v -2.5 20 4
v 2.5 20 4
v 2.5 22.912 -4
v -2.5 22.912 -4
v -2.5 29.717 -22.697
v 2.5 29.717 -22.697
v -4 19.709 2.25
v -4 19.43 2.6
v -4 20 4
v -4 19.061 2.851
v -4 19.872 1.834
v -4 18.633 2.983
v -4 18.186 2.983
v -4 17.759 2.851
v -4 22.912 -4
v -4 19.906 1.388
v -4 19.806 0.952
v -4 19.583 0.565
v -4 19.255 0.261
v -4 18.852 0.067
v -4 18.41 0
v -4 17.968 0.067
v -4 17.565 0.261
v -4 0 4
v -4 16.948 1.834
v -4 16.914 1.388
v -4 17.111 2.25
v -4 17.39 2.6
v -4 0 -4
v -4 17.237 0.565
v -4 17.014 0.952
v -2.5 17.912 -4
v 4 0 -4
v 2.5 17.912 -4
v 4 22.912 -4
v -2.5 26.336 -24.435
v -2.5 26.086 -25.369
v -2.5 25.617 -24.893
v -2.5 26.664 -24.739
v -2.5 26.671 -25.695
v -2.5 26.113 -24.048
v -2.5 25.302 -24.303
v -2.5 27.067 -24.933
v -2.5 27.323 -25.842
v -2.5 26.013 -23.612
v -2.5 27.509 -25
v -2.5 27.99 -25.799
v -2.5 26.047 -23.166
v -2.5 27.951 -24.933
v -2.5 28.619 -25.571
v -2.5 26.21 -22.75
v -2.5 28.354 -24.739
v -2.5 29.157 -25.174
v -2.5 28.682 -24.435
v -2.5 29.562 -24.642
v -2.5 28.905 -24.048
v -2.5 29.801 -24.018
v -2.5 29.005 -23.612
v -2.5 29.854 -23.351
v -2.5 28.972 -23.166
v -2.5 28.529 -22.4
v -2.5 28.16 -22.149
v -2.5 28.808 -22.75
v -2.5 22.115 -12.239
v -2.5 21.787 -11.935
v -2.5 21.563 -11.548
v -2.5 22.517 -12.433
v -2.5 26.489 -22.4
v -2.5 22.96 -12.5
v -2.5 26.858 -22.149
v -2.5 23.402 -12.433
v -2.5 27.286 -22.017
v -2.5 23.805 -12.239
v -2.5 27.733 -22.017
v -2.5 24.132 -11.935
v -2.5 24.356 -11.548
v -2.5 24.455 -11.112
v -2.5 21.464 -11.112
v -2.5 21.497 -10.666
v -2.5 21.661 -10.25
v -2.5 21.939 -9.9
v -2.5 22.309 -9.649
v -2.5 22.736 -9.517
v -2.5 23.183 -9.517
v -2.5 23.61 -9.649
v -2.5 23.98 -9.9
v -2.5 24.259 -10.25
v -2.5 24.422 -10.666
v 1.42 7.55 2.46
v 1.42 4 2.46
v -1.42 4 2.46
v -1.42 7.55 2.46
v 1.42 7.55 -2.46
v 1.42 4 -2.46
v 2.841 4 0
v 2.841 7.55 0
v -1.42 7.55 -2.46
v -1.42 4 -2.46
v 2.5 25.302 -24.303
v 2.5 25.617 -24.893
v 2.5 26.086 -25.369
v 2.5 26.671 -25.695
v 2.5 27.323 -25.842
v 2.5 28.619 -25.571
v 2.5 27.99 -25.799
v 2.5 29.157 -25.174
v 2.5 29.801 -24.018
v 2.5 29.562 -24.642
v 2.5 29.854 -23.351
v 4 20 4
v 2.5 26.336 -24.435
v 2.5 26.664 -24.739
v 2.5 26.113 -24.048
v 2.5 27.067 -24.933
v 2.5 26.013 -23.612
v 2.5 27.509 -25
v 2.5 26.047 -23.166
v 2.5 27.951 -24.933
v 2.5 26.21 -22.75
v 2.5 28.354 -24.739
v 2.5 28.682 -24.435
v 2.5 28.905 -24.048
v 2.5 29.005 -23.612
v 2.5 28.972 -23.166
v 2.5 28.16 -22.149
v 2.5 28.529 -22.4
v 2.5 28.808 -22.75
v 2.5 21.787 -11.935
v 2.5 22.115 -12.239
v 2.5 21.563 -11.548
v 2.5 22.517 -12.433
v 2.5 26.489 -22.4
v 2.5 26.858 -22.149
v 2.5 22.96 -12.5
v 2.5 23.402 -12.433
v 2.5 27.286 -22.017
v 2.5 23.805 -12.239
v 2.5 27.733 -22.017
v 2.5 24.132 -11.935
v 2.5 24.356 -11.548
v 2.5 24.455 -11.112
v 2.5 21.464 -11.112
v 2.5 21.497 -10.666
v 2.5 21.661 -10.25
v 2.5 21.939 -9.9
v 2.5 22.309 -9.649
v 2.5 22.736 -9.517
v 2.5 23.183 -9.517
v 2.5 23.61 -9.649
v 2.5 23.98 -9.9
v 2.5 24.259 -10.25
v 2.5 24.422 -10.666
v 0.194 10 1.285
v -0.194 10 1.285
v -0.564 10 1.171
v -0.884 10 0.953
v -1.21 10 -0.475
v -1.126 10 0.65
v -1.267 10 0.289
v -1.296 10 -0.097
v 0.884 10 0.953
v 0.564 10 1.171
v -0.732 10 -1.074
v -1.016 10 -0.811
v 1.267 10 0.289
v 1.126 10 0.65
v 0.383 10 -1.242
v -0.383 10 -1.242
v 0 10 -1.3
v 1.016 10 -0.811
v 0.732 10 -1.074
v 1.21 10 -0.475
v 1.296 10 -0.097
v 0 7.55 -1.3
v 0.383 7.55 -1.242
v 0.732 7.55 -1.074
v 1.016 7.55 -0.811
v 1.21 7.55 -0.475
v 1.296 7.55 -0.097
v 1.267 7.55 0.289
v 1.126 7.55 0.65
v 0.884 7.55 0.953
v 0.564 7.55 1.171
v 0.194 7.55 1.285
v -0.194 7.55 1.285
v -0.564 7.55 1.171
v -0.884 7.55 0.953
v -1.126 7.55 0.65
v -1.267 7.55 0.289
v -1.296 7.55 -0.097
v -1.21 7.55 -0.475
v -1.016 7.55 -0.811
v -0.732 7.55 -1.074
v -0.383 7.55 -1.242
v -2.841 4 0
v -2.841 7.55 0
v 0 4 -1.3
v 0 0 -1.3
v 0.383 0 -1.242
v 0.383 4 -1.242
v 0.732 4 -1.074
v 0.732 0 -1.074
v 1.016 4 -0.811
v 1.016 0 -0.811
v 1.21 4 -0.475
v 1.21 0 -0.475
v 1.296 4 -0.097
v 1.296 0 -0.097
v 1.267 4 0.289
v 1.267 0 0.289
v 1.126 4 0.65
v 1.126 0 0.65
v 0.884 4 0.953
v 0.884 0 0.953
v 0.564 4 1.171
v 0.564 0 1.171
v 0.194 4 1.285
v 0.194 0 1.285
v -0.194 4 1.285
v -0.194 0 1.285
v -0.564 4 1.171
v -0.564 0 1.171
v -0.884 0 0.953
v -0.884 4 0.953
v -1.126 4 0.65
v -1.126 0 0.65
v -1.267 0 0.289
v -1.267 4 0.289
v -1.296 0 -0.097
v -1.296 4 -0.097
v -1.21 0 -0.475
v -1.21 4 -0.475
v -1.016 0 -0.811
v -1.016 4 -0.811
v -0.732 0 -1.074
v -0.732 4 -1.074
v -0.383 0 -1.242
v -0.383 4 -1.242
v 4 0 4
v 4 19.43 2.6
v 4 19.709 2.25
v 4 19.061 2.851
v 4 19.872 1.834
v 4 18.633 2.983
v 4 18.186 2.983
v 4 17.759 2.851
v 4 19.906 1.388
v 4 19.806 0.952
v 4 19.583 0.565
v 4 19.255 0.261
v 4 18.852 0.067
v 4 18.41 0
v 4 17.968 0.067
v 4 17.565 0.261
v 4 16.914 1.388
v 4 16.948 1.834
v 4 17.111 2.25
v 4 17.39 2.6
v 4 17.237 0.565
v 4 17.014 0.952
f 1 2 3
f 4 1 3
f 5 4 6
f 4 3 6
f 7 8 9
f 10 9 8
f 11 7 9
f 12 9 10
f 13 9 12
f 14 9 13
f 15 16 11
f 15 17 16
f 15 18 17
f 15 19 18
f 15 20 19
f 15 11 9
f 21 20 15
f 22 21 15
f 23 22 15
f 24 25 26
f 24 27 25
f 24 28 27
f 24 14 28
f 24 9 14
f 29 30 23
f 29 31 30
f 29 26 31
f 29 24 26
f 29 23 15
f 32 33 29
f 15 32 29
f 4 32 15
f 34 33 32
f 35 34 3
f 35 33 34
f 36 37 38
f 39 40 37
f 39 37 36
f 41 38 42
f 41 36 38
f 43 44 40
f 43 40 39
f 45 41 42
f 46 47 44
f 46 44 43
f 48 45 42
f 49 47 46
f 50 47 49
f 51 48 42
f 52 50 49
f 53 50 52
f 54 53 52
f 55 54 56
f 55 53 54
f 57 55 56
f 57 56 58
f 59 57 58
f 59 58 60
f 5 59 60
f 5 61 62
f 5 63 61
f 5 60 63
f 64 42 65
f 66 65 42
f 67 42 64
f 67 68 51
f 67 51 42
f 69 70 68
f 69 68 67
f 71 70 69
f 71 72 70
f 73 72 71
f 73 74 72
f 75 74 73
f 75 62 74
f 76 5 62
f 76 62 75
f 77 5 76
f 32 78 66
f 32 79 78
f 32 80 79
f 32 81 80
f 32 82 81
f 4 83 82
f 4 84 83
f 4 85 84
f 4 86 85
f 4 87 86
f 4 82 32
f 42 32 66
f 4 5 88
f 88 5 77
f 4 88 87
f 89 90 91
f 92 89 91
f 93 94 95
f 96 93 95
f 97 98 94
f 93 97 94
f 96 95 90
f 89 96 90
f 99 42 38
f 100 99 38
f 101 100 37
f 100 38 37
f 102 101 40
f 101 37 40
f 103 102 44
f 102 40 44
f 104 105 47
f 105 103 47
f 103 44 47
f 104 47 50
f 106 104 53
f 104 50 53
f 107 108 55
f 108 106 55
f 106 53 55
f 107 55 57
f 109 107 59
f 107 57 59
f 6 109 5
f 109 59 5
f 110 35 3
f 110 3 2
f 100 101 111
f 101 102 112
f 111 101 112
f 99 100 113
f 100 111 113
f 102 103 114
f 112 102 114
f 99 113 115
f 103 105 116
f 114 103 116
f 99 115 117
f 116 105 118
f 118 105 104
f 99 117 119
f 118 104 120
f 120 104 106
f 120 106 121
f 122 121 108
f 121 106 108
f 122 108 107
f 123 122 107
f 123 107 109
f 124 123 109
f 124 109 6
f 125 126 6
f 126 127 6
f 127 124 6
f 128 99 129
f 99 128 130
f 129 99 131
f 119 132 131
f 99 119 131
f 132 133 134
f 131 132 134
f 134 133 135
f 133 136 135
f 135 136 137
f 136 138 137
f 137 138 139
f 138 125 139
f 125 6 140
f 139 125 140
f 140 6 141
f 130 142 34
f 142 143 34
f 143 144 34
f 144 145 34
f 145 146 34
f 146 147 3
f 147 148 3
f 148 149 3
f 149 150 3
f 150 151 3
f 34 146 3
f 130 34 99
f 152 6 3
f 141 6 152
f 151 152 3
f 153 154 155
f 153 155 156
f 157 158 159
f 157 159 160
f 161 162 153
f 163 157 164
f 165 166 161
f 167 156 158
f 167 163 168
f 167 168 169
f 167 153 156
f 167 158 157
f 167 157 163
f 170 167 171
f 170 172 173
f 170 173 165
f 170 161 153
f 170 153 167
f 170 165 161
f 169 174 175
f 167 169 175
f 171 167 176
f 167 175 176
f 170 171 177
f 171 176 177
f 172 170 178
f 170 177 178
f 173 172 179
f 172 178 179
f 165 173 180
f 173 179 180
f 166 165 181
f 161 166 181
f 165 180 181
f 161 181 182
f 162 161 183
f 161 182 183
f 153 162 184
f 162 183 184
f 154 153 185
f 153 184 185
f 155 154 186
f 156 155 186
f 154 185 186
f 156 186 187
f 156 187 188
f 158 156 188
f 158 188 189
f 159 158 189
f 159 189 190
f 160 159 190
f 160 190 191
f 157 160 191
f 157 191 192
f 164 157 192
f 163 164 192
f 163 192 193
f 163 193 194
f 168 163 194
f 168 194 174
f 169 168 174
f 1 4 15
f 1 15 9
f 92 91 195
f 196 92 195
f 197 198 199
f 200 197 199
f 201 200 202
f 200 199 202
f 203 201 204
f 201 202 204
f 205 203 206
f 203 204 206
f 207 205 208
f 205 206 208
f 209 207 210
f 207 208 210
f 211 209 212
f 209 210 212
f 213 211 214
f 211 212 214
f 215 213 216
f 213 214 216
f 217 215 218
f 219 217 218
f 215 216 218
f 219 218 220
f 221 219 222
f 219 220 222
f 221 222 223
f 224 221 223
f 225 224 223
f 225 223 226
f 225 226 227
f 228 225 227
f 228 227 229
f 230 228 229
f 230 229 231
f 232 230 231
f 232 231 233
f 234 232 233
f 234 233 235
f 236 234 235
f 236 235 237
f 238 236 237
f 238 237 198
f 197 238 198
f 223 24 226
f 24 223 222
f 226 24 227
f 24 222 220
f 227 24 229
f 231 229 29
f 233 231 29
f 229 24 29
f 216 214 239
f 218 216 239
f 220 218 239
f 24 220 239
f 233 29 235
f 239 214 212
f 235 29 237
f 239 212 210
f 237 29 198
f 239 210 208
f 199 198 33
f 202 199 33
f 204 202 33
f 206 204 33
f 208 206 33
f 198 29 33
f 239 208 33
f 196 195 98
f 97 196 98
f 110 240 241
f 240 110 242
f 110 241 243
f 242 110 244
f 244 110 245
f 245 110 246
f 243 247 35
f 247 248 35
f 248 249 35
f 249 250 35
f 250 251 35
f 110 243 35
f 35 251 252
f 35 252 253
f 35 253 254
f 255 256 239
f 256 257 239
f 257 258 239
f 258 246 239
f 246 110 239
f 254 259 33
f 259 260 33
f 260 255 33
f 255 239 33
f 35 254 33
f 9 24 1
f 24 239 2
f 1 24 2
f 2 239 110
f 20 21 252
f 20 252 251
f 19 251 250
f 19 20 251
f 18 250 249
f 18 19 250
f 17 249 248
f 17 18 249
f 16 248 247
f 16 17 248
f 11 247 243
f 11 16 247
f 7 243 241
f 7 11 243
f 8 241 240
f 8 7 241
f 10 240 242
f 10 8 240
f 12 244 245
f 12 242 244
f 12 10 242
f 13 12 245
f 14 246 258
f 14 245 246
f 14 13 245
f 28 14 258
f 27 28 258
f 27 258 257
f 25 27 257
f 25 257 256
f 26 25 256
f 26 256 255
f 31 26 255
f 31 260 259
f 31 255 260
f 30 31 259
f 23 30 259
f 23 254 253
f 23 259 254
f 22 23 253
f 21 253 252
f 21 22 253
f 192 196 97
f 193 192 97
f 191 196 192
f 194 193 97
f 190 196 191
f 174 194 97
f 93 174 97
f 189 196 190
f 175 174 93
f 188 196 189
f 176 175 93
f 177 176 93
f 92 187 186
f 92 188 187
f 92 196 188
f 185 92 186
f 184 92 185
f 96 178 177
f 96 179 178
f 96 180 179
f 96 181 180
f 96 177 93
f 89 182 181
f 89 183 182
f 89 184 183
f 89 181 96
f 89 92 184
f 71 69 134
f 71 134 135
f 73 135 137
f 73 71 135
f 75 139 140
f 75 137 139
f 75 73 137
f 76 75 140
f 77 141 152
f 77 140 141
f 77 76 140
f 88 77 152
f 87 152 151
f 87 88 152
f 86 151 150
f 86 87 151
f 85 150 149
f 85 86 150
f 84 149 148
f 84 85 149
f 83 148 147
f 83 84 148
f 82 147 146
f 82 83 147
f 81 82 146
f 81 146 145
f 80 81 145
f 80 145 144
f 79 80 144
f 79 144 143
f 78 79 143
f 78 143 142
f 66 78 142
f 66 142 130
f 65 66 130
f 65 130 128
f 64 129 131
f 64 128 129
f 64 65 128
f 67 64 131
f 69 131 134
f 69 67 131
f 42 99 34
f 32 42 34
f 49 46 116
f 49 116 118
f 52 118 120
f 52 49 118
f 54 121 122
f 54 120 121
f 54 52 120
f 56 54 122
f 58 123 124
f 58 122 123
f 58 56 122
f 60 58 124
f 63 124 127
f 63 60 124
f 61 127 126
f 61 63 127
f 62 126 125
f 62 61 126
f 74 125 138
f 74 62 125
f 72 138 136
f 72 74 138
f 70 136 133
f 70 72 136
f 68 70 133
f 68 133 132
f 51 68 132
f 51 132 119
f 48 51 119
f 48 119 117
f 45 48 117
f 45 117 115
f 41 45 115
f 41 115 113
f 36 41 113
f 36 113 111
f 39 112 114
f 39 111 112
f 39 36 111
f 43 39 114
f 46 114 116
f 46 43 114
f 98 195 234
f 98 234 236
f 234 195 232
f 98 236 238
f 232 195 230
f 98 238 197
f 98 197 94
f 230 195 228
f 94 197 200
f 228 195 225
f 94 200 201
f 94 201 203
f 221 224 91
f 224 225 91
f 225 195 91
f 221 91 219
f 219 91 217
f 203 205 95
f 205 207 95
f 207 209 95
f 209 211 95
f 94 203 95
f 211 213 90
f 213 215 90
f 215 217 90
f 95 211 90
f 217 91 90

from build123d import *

# Parameters (mm, degrees)
SKETCH_1_W               = 8
SKETCH_1_H               = 8
EXTRUDE_1_DEPTH          = 20
EXTRUDE_2_DEPTH          = 2.5
CUT_EXTRUDE_1_DEPTH      = 41.91749234
CUT_EXTRUDE_1_DEPTH_BACK = 41.91749234
SKETCH_4_R               = 1.5
CUT_EXTRUDE_2_DEPTH      = 41.91749234
SKETCH_9_R               = 1.3
CUT_EXTRUDE_3_DEPTH      = 10
EXTRUDE_3_DEPTH          = 8
CUT_EXTRUDE_START        = -4
CUT_EXTRUDE_4_DEPTH      = 3.55


with BuildPart() as part:
    # 草图1 → 凸台-拉伸1 (new body)
    with BuildSketch(Plane(origin=(0, 0, 0), x_dir=(1, 0, 0), z_dir=(0, 1, 0))):
        Rectangle(SKETCH_1_W, SKETCH_1_H)
    extrude(amount=EXTRUDE_1_DEPTH)

    # 草图2 → 凸台-拉伸2 (add, symmetric)
    with BuildSketch(Plane(origin=(0, 0, 0), x_dir=(0, 0, -1), z_dir=(1, 0, 0))):
        Polygon((-4, 20), (26, 30.919107028), (26, 25.919107028), (-4, 15), align=None)
    extrude(amount=EXTRUDE_2_DEPTH, both=True)

    # 草图4 → 切除-拉伸1 (cut, two sides: drawn at the far end of the back side and taken through both)
    with BuildSketch(Plane(origin=(2.5, 0, 0), x_dir=(0, 0, -1), z_dir=(1, 0, 0)).offset(-CUT_EXTRUDE_1_DEPTH_BACK)):
        with Locations((-1.5, 18.409925586)):
            Circle(SKETCH_4_R)
        with Locations((23.5, 27.509181442)):
            Circle(SKETCH_4_R)
        with Locations((11, 22.959553514)):
            Circle(SKETCH_4_R)
    extrude(amount=CUT_EXTRUDE_1_DEPTH + CUT_EXTRUDE_1_DEPTH_BACK, mode=Mode.SUBTRACT)

    # 草图7 → 切除-拉伸2 (cut, through all)
    with BuildSketch(Plane.ZY.offset(2.5)):
        with BuildLine():
            Line((-26, 30.919107028), (-26, 25.919107028))
            Line((-26, 25.919107028), (-24.303484649, 25.301625938))
            ThreePointArc((-24.303484649, 25.301625938), (-25.707555519, 28.312666051), (-22.696515431, 29.716736975))
            Line((-22.696515431, 29.716736975), (-26, 30.919107028))
        make_face()
    extrude(amount=-CUT_EXTRUDE_2_DEPTH, mode=Mode.SUBTRACT)

    # 草图9 → 切除-拉伸3 (cut)
    with BuildSketch(Plane.XZ):
        with Locations(Location((0, 0, 0), (0, 0, 270))):
            Circle(SKETCH_9_R)
    extrude(amount=-CUT_EXTRUDE_3_DEPTH, mode=Mode.SUBTRACT)

    # 草图11 → 凸台-拉伸3 (add)
    with BuildSketch(Plane(origin=(4, 0, 0), x_dir=(0, 0, -1), z_dir=(1, 0, 0))):
        Polygon((-4, 20), (4, 20), (4, 22.911761874), align=None)
    extrude(amount=-EXTRUDE_3_DEPTH)

    # 草图12 → 切除-拉伸4 (cut)
    with BuildSketch(Plane.XZ.offset(CUT_EXTRUDE_START)):
        Polygon((2.840563324, 0), (1.420281662, 2.46), (-1.420281662, 2.46), (-2.840563324, 0), (-1.420281662, -2.46), (1.420281662, -2.46), align=None)
    extrude(amount=-CUT_EXTRUDE_4_DEPTH, mode=Mode.SUBTRACT)


solid = part.part
